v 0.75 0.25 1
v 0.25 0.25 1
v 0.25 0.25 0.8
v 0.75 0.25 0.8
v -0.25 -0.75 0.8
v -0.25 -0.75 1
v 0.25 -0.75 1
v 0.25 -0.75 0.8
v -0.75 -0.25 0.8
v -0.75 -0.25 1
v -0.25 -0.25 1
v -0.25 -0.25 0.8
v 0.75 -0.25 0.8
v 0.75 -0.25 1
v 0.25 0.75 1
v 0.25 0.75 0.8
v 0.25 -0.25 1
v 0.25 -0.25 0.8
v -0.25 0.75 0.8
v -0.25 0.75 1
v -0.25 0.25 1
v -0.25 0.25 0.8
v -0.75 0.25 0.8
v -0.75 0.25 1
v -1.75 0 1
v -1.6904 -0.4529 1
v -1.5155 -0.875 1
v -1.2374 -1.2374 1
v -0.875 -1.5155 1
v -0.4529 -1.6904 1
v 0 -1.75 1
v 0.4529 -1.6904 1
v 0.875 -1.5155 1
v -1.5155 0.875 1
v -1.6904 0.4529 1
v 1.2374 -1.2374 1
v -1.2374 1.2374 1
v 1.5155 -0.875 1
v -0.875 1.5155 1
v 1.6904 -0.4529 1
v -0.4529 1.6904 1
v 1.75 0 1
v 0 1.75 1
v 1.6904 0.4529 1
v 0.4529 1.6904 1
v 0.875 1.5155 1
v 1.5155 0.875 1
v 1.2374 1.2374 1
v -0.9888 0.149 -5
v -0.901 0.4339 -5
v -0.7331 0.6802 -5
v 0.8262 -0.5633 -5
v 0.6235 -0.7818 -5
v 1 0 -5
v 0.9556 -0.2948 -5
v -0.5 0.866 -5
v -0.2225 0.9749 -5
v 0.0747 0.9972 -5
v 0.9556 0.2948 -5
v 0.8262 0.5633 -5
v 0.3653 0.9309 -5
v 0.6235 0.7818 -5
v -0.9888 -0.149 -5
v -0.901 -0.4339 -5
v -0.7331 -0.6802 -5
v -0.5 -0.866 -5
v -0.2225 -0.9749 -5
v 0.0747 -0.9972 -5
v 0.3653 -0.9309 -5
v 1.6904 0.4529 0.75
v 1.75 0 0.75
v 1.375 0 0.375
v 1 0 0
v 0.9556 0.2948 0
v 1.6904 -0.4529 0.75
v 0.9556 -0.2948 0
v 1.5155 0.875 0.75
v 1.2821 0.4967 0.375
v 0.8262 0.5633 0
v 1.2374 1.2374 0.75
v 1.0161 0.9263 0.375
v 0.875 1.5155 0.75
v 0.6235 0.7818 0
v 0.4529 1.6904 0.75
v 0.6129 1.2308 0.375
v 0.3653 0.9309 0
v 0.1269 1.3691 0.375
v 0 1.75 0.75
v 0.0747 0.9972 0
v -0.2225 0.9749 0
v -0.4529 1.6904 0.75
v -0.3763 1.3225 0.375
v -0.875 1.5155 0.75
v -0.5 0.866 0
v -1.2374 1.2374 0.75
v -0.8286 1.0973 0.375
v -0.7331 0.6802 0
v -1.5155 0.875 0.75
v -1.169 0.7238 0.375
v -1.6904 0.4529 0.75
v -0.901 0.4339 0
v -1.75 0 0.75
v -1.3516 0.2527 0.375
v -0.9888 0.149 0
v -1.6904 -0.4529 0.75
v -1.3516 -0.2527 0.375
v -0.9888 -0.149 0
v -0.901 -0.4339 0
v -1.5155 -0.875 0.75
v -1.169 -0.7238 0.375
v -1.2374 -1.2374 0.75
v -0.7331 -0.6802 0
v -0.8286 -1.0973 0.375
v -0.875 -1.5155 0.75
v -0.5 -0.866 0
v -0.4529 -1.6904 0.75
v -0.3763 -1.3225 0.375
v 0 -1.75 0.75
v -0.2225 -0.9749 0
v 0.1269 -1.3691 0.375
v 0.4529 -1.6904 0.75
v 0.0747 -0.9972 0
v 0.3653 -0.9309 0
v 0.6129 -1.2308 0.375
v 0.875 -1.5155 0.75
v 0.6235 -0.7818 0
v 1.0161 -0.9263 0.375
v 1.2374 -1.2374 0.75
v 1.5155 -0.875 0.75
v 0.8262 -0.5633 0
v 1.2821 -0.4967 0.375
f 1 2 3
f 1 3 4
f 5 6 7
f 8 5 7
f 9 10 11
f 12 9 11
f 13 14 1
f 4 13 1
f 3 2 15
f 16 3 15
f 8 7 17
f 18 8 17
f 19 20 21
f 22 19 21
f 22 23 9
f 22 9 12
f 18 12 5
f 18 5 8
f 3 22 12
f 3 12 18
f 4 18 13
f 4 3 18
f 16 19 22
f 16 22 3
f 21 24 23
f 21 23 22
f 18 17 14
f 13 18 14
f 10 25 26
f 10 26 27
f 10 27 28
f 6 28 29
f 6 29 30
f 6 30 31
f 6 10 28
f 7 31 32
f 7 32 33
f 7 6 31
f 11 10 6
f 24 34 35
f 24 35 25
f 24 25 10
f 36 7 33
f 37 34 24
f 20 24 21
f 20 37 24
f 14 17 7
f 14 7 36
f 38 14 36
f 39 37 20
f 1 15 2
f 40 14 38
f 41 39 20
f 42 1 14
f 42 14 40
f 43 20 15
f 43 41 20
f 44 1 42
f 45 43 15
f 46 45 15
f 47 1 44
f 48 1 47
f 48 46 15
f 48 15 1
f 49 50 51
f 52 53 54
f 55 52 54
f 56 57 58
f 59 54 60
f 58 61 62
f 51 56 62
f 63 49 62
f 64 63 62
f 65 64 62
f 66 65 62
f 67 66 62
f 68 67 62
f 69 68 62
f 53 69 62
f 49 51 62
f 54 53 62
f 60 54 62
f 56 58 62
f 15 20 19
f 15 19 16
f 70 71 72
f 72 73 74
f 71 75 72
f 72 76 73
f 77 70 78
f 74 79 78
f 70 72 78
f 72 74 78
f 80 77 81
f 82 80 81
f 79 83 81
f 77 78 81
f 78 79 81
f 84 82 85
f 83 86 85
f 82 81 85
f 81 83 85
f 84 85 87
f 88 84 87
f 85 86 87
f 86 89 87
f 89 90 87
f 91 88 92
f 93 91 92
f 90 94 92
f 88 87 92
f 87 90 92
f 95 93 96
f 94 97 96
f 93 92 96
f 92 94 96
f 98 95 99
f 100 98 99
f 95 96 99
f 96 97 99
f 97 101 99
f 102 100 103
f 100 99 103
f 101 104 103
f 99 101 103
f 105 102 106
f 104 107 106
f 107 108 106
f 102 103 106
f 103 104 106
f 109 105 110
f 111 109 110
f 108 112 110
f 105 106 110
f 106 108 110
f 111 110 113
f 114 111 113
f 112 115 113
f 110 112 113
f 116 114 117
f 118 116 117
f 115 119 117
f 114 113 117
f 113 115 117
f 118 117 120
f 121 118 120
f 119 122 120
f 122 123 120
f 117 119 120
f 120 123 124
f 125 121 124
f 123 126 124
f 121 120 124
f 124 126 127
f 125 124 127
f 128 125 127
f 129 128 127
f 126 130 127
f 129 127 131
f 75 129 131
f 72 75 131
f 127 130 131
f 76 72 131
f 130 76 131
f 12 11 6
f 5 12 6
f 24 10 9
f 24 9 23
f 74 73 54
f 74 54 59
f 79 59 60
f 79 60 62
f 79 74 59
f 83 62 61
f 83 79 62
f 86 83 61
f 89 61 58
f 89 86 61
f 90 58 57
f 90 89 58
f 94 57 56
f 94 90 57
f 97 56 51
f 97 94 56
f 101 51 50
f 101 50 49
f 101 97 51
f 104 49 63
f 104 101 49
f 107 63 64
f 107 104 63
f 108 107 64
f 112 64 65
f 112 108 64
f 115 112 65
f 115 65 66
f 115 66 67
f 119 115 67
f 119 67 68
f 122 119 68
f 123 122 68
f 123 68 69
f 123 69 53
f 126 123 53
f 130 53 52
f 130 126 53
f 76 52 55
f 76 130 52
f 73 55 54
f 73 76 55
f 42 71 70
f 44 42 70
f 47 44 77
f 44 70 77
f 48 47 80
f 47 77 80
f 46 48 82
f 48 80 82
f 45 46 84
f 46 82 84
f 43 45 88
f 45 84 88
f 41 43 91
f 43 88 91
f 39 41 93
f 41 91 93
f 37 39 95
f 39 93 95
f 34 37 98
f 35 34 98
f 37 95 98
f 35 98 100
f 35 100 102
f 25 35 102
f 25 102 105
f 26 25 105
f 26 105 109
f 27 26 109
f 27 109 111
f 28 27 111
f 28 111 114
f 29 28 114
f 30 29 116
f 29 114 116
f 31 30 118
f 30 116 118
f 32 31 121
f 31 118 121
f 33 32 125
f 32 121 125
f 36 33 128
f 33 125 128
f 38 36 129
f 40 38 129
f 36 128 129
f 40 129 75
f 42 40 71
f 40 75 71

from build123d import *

# Parameters (mm, degrees)
F0_R     = 1.75
F1_DEPTH = 1
F2_SIZE  = 0.75
F3_DEPTH = 5
F4_W     = 0.5
F4_H     = 0.5
F5_DEPTH = 0.2


with BuildPart() as f1:
    # F0 (on Top) → F1 (new body)
    with BuildSketch(Plane.XY):
        Circle(F0_R)
    extrude(amount=F1_DEPTH)

    # F2
    f2_edges = [f1.edges().sort_by_distance(p)[0] for p in [
        (-1.75, 0, 0),
    ]]
    chamfer(f2_edges, length=F2_SIZE)

    # F3 (add): a face of the model
    f3_faces = [f1.faces().sort_by_distance(p)[0] for p in [
        (0, 0, 0),
    ]]
    extrude(f3_faces, amount=F3_DEPTH)

    # F4 (on face) → F5 (cut)
    with BuildSketch(Plane.XY.offset(1)):
        with Locations((0, 0.5)):
            Rectangle(F4_W, F4_H)
        Rectangle(F4_W, F4_H)
        with Locations((0.5, 0)):
            Rectangle(F4_W, F4_H)
        with Locations((0, -0.5)):
            Rectangle(F4_W, F4_H)
        with Locations((-0.5, 0)):
            Rectangle(F4_W, F4_H)
    extrude(amount=-F5_DEPTH, mode=Mode.SUBTRACT)


solid = f1.part
